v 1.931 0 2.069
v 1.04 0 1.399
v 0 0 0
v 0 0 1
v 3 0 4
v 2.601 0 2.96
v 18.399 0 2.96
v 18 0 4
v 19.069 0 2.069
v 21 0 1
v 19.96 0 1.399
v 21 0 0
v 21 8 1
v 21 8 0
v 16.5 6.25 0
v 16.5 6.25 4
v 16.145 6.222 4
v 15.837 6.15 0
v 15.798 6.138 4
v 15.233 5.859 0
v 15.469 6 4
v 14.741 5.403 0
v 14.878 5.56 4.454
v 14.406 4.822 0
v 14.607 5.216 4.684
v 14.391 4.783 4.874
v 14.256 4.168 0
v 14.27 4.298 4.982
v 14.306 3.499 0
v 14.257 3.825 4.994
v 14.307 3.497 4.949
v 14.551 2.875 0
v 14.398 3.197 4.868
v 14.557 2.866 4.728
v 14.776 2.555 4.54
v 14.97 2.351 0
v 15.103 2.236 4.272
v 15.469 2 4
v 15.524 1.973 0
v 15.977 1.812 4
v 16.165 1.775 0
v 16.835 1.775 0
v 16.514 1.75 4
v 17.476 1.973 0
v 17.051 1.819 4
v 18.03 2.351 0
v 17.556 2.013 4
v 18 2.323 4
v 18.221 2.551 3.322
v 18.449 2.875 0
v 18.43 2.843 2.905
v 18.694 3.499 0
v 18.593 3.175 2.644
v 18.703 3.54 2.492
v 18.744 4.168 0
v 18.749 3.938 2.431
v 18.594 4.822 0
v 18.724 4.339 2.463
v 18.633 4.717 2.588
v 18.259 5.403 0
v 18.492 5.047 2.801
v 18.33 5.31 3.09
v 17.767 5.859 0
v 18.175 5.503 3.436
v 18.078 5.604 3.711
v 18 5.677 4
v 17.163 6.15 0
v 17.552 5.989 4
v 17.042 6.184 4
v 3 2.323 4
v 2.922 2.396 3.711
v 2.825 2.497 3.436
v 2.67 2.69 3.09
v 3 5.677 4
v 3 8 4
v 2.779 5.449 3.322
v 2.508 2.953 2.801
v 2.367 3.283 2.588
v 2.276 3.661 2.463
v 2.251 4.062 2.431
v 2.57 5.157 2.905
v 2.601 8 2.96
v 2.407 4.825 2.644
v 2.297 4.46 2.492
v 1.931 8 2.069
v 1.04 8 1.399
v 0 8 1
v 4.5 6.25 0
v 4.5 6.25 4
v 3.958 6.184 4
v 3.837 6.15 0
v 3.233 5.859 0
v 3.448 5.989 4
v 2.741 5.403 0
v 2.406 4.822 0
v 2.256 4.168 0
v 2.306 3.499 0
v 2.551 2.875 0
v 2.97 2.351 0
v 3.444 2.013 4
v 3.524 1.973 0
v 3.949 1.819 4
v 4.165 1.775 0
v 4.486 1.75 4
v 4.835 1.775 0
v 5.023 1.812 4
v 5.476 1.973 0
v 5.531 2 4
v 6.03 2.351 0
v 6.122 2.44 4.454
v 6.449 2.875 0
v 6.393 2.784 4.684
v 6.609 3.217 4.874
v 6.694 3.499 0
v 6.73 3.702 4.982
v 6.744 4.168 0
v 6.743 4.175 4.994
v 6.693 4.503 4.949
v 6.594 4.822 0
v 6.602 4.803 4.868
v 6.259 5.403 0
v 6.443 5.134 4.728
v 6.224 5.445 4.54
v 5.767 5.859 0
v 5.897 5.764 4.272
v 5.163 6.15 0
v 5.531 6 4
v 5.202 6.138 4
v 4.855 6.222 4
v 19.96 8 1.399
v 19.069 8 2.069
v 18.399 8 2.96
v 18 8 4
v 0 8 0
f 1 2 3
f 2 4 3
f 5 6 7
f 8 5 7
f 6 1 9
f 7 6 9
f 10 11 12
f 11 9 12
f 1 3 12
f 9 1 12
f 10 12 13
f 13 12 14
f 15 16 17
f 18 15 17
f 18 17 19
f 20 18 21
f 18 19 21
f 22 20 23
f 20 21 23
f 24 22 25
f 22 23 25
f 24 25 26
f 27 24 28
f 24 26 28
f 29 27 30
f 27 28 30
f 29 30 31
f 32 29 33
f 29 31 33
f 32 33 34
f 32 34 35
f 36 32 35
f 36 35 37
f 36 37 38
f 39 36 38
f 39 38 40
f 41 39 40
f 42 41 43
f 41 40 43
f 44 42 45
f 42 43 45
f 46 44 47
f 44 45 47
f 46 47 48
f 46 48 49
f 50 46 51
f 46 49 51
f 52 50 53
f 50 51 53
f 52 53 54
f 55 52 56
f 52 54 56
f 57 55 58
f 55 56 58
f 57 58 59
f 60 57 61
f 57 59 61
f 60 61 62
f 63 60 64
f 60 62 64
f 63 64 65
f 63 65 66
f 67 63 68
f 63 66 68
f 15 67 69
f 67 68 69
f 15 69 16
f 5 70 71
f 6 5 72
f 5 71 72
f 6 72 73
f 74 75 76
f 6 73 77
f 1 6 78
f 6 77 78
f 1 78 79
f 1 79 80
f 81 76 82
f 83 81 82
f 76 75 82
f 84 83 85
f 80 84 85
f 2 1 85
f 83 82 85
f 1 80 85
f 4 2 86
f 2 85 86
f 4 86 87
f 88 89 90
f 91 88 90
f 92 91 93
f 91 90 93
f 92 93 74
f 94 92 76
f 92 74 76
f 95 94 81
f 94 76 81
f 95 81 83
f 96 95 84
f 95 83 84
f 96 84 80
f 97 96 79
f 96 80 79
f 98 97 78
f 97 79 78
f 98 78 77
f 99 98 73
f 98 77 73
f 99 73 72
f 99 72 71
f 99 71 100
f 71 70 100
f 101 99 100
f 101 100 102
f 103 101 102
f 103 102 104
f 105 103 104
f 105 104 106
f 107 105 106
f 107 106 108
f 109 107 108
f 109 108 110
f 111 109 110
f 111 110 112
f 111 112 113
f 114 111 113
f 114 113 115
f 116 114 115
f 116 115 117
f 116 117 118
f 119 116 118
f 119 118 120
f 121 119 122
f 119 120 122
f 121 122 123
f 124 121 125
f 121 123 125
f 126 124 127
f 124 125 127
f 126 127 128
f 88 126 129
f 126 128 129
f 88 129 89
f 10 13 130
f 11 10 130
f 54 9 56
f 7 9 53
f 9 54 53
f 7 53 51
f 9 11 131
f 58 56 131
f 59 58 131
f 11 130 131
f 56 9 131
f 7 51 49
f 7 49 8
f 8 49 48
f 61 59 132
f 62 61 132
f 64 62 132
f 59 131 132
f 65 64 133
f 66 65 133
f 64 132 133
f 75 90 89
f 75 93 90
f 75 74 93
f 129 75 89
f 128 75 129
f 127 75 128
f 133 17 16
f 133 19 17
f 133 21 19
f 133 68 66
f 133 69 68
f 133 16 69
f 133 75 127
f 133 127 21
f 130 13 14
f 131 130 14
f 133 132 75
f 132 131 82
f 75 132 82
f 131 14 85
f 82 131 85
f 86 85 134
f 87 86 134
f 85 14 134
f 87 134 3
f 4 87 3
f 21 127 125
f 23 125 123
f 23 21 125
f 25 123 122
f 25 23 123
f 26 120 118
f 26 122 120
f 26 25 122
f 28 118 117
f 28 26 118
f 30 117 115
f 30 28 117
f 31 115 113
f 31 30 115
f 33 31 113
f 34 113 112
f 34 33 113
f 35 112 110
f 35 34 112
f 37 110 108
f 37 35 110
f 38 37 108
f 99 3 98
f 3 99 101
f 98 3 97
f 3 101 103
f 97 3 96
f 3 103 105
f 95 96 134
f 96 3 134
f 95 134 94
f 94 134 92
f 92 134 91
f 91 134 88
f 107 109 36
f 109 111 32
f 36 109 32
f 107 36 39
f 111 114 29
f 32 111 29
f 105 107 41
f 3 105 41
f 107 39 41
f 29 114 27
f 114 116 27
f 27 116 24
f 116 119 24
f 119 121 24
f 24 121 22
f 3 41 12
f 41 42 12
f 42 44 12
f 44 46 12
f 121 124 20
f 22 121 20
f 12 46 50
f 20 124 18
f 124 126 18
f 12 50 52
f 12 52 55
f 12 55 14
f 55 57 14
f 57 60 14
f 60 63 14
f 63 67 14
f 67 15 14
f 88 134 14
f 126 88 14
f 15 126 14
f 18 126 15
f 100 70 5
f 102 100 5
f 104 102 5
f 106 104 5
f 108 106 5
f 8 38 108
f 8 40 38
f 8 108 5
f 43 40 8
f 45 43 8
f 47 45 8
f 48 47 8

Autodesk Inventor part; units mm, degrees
ref_plane "YZ Plane" through (0, 0, 0) normal (1, 0, 0) x (0, 1, 0)
ref_plane "XZ Plane" through (0, 0, 0) normal (0, 1, 0) x (-1, 0, 0)
sketch "Sketch1" plane through (0, 0, 0) normal (0, 0, 1) x (1, 0, 0)
  line L0 (0, 0) -> (21, 0)
  line L1 (21, 0) -> (21, 8)
  line L2 (21, 8) -> (0, 8)
  line L3 (0, 8) -> (0, 0)
  dimension "d0" = 21
  dimension "d1" = 8
extrude "Extrusion1" add sketch "Sketch1" along normal blind 4
sketch "Sketch2" plane through (0, 8, 0) normal (0, 1, 0) x (1, 0, 0)
  line L0 (0, 0) -> (0, -4) projected
  line L1 (0, -4) -> (21, -4) projected
  arc A0 (3, -4) -> (0, -1) centre (-0.8979, -4.8979) ccw
  line L2 (21, 0) -> (21, -4) projected
  arc A1 (21, -1) -> (18, -4) centre (21.8979, -4.8979) ccw
  dimension "d4" = 4
  dimension "d5" = 1
  dimension "d6" = 3
  dimension "d7" = 3
extrude "Extrusion2" cut sketch "Sketch2" against normal up to next
ref_plane "Work Plane2" through (10.5, 0, 0) normal (-1, 0, 0) x (0, 0, 1)
sketch "Sketch5" plane through (10.5, 0, 0) normal (-1, 0, 0) x (0, 0, 1)
  line L0 (4, 8) -> (4, 0) projected
  line L1 (4, 0) -> (4, 8) projected
  arc A0 (4, 2) -> (4, 6) centre (2.5, 4) ccw
  point P0 (0, 0)
  dimension "d25" = 2.5
  dimension "d26" = 1.5
  dimension "d27" = 4
extrude "Extrusion4" add sketch "Sketch5" along normal mid plane 12
sketch "Sketch3" plane through (0, 0, 0) normal (0, 0, -1) x (-1, 0, 0)
  line L0 (-21, 8) -> (0, 8) projected
  line L1 (-21, 0) -> (-21, 8) projected
  point P0 (-4.5, 4)
  point P1 (-16.5, 4)
  dimension "d10" = 12
  dimension "d11" = 4.5
  dimension "d12" = 4
hole "Hole1" at (4.5, 4, 0) at (16.5, 4, 0) direction (0, 0, 1) diameter 4.5 end through all
properties part number "Infill3DLever"
